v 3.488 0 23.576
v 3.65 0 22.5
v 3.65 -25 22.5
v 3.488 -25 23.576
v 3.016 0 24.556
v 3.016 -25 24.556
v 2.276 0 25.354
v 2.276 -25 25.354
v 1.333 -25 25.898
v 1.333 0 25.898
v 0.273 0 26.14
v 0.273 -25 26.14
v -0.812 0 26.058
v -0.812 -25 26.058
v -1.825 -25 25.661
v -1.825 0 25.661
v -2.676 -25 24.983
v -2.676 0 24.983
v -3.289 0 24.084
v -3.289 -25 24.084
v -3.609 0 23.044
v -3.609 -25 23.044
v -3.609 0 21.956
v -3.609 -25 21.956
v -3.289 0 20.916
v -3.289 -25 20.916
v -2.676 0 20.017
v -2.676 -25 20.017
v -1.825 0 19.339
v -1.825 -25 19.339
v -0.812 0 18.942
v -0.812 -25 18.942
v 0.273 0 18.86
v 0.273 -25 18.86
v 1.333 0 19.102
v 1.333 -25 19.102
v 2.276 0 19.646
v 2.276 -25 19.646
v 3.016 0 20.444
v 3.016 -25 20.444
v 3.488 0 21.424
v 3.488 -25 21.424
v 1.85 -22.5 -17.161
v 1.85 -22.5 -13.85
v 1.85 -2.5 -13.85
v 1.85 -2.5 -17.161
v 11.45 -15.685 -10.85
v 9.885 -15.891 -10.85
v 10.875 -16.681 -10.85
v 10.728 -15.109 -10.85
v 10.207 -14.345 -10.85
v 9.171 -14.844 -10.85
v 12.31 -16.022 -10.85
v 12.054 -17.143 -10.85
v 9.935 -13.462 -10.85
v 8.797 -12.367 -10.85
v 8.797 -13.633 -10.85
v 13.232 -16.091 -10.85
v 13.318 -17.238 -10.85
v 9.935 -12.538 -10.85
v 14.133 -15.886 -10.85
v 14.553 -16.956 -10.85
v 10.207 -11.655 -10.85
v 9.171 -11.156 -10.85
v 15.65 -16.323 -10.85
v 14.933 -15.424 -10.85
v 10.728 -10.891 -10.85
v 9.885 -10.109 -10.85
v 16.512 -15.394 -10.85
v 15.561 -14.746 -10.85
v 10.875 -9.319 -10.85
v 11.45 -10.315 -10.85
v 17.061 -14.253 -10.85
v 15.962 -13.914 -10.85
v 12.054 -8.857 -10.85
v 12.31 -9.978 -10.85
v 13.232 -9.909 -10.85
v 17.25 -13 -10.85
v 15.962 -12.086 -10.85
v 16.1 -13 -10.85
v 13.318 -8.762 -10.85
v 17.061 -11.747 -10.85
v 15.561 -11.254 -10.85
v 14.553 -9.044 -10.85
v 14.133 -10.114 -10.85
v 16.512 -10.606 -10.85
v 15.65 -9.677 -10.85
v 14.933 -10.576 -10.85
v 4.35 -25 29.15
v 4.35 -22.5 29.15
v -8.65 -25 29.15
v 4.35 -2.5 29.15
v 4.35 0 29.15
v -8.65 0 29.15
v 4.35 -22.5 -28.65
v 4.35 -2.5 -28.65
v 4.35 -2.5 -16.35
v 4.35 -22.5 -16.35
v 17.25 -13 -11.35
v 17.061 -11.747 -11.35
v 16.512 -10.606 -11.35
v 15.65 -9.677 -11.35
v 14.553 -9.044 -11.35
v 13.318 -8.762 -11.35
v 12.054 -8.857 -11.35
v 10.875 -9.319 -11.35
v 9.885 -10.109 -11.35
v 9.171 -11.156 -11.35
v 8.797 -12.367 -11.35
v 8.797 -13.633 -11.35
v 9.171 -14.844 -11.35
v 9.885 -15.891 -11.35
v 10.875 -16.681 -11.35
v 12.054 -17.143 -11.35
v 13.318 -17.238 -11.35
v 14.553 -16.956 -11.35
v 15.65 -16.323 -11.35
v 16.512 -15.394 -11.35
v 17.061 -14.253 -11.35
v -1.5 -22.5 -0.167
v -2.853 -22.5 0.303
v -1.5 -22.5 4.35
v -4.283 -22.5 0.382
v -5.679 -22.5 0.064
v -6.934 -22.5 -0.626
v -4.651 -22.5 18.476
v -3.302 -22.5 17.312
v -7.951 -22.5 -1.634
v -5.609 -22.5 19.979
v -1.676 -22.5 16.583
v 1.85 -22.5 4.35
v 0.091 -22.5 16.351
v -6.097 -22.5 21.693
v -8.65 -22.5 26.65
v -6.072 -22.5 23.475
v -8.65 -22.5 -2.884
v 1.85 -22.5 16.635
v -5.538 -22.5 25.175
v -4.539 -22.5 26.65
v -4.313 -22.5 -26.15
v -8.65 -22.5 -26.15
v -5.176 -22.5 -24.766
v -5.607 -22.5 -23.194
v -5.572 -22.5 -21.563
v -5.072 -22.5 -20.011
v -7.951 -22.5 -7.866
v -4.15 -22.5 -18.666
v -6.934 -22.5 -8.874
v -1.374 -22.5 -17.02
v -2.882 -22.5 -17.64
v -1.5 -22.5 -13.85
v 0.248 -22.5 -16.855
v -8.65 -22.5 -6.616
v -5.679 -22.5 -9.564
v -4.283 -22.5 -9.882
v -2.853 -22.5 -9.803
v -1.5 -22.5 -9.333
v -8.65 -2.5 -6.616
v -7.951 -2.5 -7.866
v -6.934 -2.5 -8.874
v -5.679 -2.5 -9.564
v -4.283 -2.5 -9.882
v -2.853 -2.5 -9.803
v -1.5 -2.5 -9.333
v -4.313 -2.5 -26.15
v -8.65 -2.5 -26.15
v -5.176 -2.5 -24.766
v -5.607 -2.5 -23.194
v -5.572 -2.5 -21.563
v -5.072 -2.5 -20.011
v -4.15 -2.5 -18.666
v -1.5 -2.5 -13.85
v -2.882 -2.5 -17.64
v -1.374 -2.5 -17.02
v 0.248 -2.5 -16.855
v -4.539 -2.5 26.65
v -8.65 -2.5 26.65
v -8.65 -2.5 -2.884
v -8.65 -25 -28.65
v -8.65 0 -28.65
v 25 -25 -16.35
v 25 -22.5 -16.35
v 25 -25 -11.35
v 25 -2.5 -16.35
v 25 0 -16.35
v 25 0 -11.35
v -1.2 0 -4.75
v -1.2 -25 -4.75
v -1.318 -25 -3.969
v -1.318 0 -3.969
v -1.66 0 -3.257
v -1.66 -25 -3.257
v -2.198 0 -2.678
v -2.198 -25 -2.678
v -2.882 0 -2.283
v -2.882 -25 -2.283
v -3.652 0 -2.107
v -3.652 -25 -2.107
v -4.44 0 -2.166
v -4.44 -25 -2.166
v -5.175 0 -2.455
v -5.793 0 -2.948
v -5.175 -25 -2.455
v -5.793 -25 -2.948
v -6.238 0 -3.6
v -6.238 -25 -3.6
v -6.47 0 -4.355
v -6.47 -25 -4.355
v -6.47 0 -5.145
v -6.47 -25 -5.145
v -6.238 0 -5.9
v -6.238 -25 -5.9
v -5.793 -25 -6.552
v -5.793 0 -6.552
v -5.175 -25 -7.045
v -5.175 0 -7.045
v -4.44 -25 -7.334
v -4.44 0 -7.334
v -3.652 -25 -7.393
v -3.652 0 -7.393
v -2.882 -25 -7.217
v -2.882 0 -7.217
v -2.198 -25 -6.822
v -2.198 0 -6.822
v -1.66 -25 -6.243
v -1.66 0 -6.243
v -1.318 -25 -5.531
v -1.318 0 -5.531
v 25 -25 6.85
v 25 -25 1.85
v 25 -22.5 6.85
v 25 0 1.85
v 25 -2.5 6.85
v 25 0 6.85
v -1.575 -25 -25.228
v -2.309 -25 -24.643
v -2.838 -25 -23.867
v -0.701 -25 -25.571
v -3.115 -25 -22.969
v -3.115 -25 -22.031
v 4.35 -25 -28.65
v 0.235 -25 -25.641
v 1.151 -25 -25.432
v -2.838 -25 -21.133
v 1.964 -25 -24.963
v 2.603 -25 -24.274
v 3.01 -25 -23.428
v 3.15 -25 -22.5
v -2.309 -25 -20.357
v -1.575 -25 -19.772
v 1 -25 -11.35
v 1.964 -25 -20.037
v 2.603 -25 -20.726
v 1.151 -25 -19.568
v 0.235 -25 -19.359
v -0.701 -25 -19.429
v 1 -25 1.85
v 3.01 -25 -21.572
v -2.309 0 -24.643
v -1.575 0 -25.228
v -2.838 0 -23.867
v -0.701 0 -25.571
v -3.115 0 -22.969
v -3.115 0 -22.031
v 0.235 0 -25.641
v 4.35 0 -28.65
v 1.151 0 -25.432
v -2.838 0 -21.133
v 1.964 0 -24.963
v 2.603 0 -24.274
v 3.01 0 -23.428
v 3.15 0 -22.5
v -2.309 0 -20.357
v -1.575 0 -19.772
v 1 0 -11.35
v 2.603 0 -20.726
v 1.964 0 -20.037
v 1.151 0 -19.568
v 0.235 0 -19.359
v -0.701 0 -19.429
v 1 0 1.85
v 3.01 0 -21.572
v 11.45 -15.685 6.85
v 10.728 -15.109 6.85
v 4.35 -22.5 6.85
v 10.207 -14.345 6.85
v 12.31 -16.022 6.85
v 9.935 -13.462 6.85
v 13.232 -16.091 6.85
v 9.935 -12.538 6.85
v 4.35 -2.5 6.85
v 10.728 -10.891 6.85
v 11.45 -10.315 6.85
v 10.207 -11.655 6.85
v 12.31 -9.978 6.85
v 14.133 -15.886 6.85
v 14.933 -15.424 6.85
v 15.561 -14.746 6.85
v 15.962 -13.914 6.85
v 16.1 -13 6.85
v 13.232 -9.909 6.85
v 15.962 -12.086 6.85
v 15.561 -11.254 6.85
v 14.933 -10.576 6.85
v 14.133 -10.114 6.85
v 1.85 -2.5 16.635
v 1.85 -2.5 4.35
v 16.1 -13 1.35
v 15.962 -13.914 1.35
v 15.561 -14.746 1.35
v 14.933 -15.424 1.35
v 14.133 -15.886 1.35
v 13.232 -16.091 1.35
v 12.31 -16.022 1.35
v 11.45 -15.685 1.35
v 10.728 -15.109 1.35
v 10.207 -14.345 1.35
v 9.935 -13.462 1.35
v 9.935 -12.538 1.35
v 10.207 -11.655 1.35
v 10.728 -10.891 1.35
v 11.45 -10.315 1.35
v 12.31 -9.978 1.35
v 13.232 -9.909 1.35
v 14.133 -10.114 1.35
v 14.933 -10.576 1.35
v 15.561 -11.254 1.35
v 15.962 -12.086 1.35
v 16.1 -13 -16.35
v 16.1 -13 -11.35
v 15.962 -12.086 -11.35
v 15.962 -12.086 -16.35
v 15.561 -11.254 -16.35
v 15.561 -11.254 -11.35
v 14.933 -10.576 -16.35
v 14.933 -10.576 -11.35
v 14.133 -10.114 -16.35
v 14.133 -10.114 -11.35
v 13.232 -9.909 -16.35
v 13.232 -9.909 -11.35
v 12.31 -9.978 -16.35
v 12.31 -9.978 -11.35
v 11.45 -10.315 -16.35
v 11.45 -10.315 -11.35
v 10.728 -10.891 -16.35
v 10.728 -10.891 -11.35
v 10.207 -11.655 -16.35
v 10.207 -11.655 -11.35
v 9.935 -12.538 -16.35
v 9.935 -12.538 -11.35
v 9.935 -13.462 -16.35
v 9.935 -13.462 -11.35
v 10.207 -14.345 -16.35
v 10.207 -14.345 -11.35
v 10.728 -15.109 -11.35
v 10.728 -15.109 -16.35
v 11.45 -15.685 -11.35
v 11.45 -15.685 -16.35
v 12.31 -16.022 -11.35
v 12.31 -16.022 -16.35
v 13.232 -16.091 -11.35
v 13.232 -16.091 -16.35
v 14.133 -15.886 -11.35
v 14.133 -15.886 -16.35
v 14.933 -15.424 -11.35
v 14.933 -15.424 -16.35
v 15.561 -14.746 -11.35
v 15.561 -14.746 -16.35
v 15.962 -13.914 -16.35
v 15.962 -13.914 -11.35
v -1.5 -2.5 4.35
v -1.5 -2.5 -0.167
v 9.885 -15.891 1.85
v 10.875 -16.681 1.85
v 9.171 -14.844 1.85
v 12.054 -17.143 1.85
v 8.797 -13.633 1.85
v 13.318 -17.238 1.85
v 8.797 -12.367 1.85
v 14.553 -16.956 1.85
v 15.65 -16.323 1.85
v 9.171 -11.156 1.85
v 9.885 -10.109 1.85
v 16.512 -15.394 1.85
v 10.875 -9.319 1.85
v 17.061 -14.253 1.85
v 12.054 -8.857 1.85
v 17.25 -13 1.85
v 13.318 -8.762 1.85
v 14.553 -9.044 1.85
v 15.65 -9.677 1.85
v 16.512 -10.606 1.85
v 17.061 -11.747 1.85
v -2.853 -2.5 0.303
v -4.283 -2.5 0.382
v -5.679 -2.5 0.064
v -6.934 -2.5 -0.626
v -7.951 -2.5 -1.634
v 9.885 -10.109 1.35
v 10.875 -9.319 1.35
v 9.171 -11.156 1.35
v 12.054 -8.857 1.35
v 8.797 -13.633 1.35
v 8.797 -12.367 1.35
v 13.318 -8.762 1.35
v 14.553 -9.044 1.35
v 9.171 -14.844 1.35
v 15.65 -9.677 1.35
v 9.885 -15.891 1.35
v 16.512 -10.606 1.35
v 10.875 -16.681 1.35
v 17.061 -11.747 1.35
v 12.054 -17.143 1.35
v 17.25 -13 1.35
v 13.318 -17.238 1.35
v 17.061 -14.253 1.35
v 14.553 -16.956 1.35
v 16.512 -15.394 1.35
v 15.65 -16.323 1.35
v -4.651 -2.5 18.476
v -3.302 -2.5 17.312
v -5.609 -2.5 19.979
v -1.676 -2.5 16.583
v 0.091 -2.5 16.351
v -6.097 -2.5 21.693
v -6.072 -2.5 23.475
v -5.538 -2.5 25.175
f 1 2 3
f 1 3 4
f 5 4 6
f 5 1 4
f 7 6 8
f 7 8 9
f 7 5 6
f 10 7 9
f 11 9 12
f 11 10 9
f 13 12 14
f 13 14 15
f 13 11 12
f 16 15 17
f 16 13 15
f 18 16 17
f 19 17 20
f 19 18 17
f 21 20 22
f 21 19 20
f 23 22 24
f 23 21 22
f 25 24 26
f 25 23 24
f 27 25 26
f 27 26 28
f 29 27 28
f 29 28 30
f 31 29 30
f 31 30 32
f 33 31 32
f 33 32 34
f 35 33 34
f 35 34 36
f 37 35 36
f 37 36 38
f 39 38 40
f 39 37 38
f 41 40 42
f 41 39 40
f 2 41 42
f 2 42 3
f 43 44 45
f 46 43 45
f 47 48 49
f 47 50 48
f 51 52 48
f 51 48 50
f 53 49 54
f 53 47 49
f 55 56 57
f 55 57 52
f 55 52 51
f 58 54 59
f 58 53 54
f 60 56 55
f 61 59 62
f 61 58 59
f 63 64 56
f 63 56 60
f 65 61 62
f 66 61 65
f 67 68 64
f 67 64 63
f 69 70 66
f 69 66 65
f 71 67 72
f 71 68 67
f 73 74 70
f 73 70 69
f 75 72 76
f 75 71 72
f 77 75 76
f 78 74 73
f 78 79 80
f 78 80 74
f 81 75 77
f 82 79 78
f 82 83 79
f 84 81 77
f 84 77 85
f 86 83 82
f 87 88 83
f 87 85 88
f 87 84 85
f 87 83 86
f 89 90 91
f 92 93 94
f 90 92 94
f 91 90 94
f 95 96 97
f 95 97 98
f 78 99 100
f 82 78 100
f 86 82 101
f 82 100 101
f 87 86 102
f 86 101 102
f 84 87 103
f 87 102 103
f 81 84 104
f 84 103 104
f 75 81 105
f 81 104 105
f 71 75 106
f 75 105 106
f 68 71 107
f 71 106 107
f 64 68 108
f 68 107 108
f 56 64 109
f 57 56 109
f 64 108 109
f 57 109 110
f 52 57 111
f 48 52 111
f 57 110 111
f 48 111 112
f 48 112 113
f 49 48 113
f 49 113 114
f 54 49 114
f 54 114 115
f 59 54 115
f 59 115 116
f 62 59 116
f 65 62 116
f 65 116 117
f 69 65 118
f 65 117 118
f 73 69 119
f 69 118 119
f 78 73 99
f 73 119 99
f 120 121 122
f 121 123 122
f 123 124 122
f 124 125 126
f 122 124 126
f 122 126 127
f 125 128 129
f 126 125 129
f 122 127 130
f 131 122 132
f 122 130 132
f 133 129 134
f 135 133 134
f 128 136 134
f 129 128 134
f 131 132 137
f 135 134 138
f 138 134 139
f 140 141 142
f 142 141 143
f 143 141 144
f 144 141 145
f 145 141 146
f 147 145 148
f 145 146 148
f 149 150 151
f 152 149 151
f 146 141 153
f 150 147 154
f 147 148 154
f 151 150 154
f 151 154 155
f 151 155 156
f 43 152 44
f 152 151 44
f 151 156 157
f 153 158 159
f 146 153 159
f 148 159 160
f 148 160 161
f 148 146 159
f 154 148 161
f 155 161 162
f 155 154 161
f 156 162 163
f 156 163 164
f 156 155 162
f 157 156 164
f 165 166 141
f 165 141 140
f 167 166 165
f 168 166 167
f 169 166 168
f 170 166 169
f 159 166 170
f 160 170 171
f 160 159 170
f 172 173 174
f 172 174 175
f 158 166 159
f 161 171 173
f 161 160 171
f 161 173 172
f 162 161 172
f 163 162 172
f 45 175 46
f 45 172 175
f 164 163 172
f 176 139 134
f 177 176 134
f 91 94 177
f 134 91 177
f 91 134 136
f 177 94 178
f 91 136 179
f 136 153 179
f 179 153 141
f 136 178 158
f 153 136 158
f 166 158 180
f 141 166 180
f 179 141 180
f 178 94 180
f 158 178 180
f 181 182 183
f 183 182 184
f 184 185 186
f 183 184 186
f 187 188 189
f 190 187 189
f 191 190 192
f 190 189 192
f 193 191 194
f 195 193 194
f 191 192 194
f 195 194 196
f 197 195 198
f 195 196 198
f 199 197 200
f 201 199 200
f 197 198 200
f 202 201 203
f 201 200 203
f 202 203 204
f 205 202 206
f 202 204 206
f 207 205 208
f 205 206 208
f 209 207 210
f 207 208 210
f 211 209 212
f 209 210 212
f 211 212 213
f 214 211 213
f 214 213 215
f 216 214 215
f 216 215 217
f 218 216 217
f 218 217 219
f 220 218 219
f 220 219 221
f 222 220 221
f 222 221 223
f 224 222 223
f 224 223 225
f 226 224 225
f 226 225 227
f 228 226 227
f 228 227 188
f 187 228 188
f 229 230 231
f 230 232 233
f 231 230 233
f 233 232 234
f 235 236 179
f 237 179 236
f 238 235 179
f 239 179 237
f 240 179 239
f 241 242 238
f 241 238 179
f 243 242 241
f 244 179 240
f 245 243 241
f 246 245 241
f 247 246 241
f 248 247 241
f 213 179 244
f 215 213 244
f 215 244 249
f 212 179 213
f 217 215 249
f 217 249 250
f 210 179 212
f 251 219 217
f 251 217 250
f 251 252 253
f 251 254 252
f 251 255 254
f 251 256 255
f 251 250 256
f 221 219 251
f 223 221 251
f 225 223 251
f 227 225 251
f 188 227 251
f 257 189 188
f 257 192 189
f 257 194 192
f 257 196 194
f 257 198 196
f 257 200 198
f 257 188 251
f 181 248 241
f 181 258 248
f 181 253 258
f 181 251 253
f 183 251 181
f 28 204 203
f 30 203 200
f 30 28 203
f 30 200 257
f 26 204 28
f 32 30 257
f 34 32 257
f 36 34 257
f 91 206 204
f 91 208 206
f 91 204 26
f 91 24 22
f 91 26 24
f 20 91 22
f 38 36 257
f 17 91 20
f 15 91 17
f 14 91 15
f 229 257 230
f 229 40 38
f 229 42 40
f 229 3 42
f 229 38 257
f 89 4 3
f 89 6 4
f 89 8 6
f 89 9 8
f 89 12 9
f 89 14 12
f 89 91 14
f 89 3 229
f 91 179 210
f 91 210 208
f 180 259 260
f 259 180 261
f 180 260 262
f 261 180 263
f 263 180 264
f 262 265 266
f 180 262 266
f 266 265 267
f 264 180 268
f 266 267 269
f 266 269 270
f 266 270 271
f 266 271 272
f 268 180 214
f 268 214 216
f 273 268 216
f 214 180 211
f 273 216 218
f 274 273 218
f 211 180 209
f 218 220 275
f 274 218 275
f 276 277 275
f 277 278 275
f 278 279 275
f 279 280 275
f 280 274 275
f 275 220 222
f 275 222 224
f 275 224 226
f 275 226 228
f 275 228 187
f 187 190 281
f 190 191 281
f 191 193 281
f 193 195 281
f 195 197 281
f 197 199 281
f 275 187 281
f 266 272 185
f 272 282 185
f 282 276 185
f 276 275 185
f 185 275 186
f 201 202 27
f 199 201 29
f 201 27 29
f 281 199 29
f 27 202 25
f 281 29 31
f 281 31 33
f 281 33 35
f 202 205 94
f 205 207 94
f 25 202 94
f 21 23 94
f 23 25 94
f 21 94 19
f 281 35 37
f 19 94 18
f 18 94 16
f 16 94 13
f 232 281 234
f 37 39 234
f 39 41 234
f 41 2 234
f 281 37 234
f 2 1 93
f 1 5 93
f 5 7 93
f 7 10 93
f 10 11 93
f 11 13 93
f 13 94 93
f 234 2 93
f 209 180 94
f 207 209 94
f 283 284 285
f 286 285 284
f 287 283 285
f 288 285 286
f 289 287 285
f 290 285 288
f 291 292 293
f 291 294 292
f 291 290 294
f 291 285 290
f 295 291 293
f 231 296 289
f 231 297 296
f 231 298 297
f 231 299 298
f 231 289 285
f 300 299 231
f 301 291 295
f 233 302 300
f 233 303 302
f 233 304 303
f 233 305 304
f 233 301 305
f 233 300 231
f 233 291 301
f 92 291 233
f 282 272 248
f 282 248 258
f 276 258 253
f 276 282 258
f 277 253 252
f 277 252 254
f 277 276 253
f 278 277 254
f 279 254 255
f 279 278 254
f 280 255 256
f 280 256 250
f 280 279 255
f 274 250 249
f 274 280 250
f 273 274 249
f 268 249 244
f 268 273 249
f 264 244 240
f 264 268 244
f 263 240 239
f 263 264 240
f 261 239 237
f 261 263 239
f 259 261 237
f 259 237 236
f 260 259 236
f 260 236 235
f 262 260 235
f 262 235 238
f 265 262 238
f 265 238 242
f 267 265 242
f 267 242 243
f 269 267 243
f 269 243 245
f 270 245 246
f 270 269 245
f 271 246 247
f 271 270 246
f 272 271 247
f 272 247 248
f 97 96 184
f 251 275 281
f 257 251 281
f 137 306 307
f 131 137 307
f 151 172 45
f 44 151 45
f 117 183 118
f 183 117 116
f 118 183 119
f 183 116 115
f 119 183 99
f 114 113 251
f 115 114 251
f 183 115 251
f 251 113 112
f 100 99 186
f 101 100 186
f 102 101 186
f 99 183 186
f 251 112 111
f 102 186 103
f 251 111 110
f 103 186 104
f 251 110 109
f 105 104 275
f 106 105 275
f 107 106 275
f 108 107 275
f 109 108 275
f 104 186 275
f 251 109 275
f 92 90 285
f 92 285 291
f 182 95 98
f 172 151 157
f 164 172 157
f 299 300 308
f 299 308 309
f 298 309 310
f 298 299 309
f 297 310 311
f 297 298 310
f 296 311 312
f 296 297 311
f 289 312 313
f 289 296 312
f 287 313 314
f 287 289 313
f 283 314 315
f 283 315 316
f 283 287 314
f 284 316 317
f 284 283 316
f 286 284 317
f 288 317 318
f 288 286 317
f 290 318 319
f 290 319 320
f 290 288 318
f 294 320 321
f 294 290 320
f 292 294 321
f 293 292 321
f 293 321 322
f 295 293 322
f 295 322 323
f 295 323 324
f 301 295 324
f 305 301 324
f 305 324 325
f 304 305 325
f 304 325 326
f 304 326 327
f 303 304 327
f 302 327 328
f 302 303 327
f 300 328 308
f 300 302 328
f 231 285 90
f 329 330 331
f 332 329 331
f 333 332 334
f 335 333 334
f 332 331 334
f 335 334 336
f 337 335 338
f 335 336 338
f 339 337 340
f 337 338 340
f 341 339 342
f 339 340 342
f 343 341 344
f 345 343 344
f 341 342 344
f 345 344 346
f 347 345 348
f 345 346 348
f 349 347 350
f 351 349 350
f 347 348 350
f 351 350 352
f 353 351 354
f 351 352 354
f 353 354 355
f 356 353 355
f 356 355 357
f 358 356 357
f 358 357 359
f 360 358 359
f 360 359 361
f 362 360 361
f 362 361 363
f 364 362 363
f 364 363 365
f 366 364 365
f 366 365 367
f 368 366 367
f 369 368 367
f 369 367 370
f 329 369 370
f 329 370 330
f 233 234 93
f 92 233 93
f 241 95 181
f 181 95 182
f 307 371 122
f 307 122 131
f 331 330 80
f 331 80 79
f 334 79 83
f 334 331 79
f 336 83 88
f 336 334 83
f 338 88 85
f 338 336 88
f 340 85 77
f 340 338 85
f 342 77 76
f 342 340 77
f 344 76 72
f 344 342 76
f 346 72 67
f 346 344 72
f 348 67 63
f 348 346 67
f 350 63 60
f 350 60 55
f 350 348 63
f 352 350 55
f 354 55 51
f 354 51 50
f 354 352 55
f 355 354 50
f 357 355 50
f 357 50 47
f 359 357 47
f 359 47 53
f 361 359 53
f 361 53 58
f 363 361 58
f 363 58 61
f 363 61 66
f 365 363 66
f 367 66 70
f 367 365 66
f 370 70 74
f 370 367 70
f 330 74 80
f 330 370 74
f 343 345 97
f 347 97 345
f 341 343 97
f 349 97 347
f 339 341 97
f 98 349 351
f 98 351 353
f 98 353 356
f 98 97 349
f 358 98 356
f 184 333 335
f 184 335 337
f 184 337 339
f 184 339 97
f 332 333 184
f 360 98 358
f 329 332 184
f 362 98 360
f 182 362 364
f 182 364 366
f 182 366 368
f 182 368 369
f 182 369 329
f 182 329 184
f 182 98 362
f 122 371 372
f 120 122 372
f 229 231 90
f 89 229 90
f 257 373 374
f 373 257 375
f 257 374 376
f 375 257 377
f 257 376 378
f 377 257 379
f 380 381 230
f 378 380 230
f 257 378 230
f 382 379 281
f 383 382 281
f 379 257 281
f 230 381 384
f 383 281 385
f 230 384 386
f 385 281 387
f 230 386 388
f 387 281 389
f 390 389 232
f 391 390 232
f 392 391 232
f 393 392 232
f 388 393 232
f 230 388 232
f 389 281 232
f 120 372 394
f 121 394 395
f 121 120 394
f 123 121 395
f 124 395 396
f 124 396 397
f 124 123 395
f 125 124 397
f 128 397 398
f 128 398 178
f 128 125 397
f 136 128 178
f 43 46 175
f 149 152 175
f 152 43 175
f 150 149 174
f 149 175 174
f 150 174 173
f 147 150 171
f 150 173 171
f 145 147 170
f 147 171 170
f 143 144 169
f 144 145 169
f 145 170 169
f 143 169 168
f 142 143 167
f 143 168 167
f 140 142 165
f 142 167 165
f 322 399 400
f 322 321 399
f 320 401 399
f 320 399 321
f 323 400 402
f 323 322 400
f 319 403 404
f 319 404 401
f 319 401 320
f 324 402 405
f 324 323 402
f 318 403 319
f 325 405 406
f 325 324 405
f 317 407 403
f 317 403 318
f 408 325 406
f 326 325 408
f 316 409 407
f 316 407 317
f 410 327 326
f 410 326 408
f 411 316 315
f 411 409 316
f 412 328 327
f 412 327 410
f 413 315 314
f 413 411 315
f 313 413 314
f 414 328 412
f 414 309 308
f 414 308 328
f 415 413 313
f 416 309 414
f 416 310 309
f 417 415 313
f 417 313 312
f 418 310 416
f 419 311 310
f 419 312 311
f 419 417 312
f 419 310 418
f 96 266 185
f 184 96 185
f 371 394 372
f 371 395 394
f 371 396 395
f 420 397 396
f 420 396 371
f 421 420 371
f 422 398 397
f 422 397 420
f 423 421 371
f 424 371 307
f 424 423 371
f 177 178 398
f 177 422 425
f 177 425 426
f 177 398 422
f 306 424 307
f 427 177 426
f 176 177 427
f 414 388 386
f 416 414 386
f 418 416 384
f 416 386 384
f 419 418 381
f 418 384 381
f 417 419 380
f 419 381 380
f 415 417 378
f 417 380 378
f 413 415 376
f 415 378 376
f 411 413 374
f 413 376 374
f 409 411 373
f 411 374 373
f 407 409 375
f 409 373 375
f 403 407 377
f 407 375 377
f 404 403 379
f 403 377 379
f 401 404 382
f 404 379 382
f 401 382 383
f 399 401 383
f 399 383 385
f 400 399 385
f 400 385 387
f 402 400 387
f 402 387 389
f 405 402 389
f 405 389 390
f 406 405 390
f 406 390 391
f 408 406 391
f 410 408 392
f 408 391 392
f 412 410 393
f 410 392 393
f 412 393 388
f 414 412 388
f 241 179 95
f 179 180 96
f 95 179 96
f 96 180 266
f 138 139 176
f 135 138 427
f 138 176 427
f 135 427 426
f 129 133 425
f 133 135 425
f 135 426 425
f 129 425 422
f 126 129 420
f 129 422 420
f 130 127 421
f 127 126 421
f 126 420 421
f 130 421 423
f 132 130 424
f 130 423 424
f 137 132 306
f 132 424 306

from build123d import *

# Parameters (mm, degrees)
F0_R          = 3.15
F0_R_2        = 3.65
F1_DEPTH      = 25
F2_R          = 3.1
F3_DEPTH      = 17.301
F3_DEPTH_BACK = 40.501
F2_R_2        = 4.25
F4_DEPTH      = 0.5
F5_R          = 4.25
F5_R_2        = 3.1
F6_DEPTH      = 0.5
F7_W          = 20.65
F7_H          = 20
F8_DEPTH      = 22.3
F9_W          = 20.65
F9_H          = 20
F10_DEPTH     = 12.3
F11_R         = 2.65
F12_DEPTH     = 25.001
F13_T         = 2.5
F13_T3_DEPTH  = 27.3
F13_T5_DEPTH  = 25.65
F13_T7_DEPTH  = 30
F13_T9_DEPTH  = 25
F13_T11_DEPTH = 17.3


# Not quite as in the source:
# - a shell that OpenCascade refuses in one call is made with other operations: the cavity is built on its own and cut out


with BuildPart() as f1:
    # F0 (on Front) → F1 (new body)
    with BuildSketch(Plane.XZ):
        Polygon((4.35, 29.15), (-8.65, 29.15), (-8.65, -28.65), (4.35, -28.65), (25, -16.35), (25, -11.35), (1, -11.35), (1, 1.85), (25, 1.85), (25, 6.85), align=None)
        with Locations((0, -22.5)):
            Circle(F0_R, mode=Mode.SUBTRACT)
        with Locations((0, 22.5)):
            Circle(F0_R_2, mode=Mode.SUBTRACT)
    extrude(amount=F1_DEPTH)

    # F2 (on face) → F3 (cut, two sides)
    with BuildSketch(Plane.XY.offset(-11.35)) as f3_sk:
        with Locations((13, -13)):
            Circle(F2_R)
    extrude(amount=-F3_DEPTH, mode=Mode.SUBTRACT)
    extrude(f3_sk.sketch, amount=F3_DEPTH_BACK, mode=Mode.SUBTRACT)

    # F2 (on face) → F4 (join)
    with BuildSketch(Plane.XY.offset(-11.35)):
        with Locations((13, -13)):
            Circle(F2_R_2)
        with Locations((13, -13)):
            Circle(F2_R, mode=Mode.SUBTRACT)
    extrude(amount=F4_DEPTH)

    # F5 (on face) → F6 (join)
    with BuildSketch(Plane(origin=(0, 0, 1.85), x_dir=(1, 0, 0), z_dir=(0, 0, -1))):
        with Locations((13, 13)):
            Circle(F5_R)
        with Locations((13, 13)):
            Circle(F5_R_2, mode=Mode.SUBTRACT)
    extrude(amount=F6_DEPTH)

    # F7 (on face) → F8 (cut)
    with BuildSketch(Plane.XY.offset(29.15)):
        with Locations((14.675, -12.5)):
            Rectangle(F7_W, F7_H)
    extrude(amount=-F8_DEPTH, mode=Mode.SUBTRACT)

    # F9 (on face) → F10 (cut)
    with BuildSketch(Plane(origin=(0, 0, -28.65), x_dir=(1, 0, 0), z_dir=(0, 0, -1))):
        with Locations((14.675, 12.5)):
            Rectangle(F9_W, F9_H)
    extrude(amount=-F10_DEPTH, mode=Mode.SUBTRACT)

    # F11 (on face) → F12 (cut, through all)
    with BuildSketch(Plane.XZ.offset(25)):
        with Locations((-3.85, -4.75)):
            Circle(F11_R)
    extrude(amount=-F12_DEPTH, mode=Mode.SUBTRACT)

    # F13: shell of thickness 2.5, made by hand


with BuildPart() as f13_core1:
    # F13_t2: copy of F1
    add(f1.part)

    # the walls: a layer under each face that stays
    f13_faces = [f13_core1.faces().sort_by_distance(p)[0] for p in [
        (14.675, -1.25, 18),
        (-3.0416666667, 0, -19.0166666667),
        (-2.15, -12.5, 29.15),
        (14.675, -2.5, 10.5666666667),
        (25, -12.5, 4.35),
        (5, -20.8333333333, 1.85),
        (1, -12.5, -4.75),
        (-2.15, -12.5, -28.65),
        (21, -20.8333333333, -11.35),
        (14.675, -1.25, -22.5),
        (25, -12.5, -13.85),
        (-6.5, -12.5, -4.75),
        (-3.15, -12.5, -22.5),
        (-3.65, -12.5, 22.5),
        (4.35, -12.5, 18),
        (14.675, -23.75, 18),
        (-3.0416666667, -25, -19.0166666667),
        (7.7916666667, -19.1666666667, 6.85),
        (8.75, -13, 1.6),
        (4.35, -12.5, -22.5),
        (14.675, -23.75, -22.5),
        (8.75, -13, -11.1),
        (7.7916666667, -2.5, -18.4),
        (7.7916666667, -5.8333333333, -16.35),
        (7.7916666667, -22.5, 10.5666666667),
        (9.9, -13, 4.35),
        (10.1666666667, -10.1666666667, 1.35),
        (14.675, -22.5, -18.4),
        (10.1666666667, -15.8333333333, -10.85),
        (9.9, -13, -13.85),
        (9.9, -13, 1.6),
        (9.9, -13, -11.1),
    ]]
    thicken(f13_faces, amount=-F13_T, mode=Mode.SUBTRACT)

    # F13_s4 → F13_t3 (cut)
    with BuildSketch(Plane.XY.offset(4.35)):
        Polygon((4.375, -2.525), (4.35, 0), (1.85, 0), (1.85, -2.5), align=None)
        Polygon((4.375, -22.475), (1.85, -22.5), (1.85, -25), (4.35, -25), align=None)
    extrude(amount=F13_T3_DEPTH, mode=Mode.SUBTRACT)

    # F13_s6 → F13_t5 (cut)
    with BuildSketch(Plane.YZ.offset(1.85)):
        Polygon((-2.525, 6.875), (0, 6.85), (0, 4.35), (-2.5, 4.35), align=None)
        Polygon((-22.475, 6.875), (-22.5, 4.35), (-25, 4.35), (-25, 6.85), align=None)
        Polygon((-2.525, -16.375), (0, -16.35), (0, -13.85), (-2.5, -13.85), align=None)
        Polygon((-22.475, -16.375), (-22.5, -13.85), (-25, -13.85), (-25, -16.35), align=None)
    extrude(amount=F13_T5_DEPTH, mode=Mode.SUBTRACT)

    # F13_s8 → F13_t7 (cut)
    with BuildSketch(Plane.XZ.offset(-2.5)):
        Polygon((1.025, 1.825), (1, 4.35), (-1.5, 4.35), (-1.5, 1.85), align=None)
        Polygon((1.025, -11.325), (-1.5, -11.35), (-1.5, -13.85), (1, -13.85), align=None)
    extrude(amount=F13_T7_DEPTH, mode=Mode.SUBTRACT)

    # F13_s10 → F13_t9 (cut)
    with BuildSketch(Plane.XZ):
        Polygon((4.375, 6.875), (1.85, 6.85), (1.85, 4.35), (4.35, 4.35), align=None)
        Polygon((4.375, -16.375), (1.85, -16.35), (1.85, -13.85), (4.35, -13.85), align=None)
    extrude(amount=F13_T9_DEPTH, mode=Mode.SUBTRACT)

    # F13_s12 → F13_t11 (cut)
    with BuildSketch(Plane.XY.offset(-31.15)):
        Polygon((4.375, -22.475), (1.85, -22.5), (1.85, -25), (4.35, -25), align=None)
        Polygon((4.375, -2.525), (1.85, -2.5), (1.85, 0), (4.35, 0), align=None)
    extrude(amount=F13_T11_DEPTH, mode=Mode.SUBTRACT)

    # F13_s13 → F13_t14 (revolve, cut)
    with BuildSketch(Plane.XZ.offset(13)):
        Polygon((17.275, 1.825), (17.25, 4.35), (14.75, 4.35), (14.75, 1.85), align=None)
    revolve(axis=Axis((13, -13, 1.85), (0, 0, -1)), mode=Mode.SUBTRACT)

    # F13_s15 → F13_t16 (revolve, cut)
    with BuildSketch(Plane.XZ.offset(13)):
        Polygon((17.275, -11.325), (17.25, -13.85), (14.75, -13.85), (14.75, -11.35), align=None)
    revolve(axis=Axis((13, -13, -11.35), (0, 0, 1)), mode=Mode.SUBTRACT)


with BuildPart() as f1_1:
    add(f1.part)

    # what is left inside the walls is the cavity
    f13_cavity = [f13_core1.part.solids().sort_by_distance(p)[0] for p in [
        (-8.625, -15.833333, 11.883073),
        (-8.625, -15.833333, -16.383073),
    ]]
    add(f13_cavity, mode=Mode.SUBTRACT)


solid = f1_1.part
